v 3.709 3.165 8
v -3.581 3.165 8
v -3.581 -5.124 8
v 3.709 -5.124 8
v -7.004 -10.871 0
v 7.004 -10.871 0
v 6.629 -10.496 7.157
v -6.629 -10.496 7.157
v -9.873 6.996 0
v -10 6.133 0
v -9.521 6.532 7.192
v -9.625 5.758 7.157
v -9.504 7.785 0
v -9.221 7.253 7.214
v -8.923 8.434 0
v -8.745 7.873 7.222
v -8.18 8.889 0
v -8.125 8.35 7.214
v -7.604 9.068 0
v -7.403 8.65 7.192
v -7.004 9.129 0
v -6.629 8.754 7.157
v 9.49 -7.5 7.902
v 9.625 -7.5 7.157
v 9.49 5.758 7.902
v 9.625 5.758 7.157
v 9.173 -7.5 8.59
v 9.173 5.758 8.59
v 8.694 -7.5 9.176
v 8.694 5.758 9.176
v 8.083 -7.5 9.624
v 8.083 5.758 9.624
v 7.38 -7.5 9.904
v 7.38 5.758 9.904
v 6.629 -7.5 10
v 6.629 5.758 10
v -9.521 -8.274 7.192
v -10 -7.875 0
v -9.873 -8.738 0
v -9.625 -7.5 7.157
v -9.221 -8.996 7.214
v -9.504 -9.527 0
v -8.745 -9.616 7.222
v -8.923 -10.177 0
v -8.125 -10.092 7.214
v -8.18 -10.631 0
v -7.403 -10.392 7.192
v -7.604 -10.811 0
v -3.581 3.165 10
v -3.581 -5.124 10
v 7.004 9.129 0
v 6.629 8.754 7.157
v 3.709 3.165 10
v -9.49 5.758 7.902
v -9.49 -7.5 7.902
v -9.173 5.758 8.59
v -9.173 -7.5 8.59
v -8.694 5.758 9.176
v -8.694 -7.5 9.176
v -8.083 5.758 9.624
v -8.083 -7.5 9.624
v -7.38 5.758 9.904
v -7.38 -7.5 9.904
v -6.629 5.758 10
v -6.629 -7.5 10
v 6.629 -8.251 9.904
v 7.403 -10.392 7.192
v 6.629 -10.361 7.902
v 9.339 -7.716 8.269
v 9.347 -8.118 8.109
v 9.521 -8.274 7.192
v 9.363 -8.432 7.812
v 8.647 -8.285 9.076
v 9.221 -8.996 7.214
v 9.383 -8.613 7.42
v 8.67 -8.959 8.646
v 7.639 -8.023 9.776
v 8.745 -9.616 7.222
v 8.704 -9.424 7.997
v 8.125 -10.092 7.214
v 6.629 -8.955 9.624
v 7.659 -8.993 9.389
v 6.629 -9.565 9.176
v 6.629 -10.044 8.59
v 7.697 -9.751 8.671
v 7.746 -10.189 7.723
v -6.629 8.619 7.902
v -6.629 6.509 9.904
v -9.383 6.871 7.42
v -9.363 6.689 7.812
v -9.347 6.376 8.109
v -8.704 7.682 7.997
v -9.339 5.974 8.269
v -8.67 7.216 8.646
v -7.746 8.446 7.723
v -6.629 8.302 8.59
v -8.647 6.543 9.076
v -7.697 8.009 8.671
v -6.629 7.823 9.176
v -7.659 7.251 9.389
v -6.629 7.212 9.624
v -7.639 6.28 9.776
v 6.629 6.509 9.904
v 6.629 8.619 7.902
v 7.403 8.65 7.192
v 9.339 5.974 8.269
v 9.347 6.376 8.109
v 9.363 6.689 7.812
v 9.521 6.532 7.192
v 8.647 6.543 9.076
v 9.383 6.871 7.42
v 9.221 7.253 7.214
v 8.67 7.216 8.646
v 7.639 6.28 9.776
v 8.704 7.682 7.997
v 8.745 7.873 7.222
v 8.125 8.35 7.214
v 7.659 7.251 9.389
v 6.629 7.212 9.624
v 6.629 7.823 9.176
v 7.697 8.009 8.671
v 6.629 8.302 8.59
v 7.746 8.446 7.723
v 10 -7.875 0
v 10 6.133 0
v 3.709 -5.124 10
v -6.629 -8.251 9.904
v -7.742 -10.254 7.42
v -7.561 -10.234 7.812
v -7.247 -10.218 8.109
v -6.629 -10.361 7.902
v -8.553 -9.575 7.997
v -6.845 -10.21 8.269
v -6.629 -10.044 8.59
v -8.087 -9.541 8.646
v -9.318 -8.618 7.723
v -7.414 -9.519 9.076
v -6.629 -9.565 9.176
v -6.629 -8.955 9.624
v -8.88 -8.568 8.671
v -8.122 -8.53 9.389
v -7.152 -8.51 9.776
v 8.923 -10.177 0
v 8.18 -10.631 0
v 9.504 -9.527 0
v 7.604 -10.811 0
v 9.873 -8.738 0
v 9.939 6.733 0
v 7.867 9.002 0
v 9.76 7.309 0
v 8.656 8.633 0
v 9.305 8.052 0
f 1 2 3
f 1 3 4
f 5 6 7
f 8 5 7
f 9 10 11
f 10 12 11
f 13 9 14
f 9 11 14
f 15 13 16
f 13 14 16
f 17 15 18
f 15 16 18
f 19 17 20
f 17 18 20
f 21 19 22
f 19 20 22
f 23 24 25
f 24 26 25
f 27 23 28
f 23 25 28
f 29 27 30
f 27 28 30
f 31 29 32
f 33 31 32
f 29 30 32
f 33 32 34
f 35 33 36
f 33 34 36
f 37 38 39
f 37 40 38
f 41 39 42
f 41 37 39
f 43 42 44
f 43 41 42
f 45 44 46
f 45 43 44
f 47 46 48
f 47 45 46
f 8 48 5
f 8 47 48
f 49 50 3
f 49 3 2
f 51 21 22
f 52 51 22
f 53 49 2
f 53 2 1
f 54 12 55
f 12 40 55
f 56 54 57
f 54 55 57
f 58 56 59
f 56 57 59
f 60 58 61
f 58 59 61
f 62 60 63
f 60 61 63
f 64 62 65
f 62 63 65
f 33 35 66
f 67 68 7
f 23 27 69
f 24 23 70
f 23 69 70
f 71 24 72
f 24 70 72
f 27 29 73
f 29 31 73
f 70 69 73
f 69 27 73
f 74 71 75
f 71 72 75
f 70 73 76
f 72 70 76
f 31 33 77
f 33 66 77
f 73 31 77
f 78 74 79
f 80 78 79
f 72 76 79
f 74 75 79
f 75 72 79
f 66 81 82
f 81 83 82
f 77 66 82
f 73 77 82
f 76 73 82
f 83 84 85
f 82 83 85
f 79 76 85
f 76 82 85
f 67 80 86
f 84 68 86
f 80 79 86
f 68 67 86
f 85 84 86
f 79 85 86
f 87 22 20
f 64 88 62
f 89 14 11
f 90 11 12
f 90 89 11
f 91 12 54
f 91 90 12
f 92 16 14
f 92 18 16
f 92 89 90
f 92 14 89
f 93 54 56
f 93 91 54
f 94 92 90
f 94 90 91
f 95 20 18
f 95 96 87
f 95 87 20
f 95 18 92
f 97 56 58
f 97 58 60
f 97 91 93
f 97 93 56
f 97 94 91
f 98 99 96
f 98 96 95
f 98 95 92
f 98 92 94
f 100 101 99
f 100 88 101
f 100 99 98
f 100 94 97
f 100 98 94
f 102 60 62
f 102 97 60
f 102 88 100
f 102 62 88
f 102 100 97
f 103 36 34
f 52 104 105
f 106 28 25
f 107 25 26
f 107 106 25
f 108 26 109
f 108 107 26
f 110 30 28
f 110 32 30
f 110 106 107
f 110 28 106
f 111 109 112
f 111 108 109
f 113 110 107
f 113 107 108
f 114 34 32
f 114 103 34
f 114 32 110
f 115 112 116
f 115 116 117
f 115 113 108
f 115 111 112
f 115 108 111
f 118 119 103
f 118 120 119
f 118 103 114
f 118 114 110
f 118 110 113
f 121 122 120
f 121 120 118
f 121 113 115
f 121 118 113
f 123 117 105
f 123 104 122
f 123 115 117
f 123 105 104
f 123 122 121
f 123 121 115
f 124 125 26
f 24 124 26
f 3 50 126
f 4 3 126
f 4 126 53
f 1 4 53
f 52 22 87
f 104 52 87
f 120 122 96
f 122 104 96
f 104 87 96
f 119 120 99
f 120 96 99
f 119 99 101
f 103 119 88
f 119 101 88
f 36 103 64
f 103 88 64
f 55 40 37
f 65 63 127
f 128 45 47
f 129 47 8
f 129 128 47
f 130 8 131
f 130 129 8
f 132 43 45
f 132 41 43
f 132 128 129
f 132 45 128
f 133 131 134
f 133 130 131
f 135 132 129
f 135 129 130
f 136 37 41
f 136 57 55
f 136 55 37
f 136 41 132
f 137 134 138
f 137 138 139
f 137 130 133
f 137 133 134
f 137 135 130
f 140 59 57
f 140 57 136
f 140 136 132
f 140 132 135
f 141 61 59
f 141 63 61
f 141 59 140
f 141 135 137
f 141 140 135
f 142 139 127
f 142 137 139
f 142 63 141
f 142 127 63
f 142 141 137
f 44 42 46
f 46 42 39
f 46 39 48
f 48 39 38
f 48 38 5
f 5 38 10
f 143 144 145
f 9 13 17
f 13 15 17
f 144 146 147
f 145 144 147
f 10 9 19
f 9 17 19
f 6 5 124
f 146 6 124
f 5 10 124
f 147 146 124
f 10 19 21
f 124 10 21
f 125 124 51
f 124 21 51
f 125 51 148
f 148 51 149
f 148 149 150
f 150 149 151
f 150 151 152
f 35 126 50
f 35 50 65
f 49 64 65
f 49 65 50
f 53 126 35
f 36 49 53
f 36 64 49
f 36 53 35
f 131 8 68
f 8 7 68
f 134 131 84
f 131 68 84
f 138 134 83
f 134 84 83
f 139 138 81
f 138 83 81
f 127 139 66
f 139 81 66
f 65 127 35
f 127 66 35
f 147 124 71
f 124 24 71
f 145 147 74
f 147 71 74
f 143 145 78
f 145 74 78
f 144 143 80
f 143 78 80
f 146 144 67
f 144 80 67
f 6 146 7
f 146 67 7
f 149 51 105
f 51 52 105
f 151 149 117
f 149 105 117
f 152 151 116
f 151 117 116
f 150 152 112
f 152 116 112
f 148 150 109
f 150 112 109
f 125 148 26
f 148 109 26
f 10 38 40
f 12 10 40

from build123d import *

# Parameters (mm, degrees)
F0_W     = 20
F0_H     = 20
F1_DEPTH = 10
F1_TAPER = 3
F2_R     = 3
F3_W     = 7.29034096
F3_H     = 8.2890868653
F4_DEPTH = 2


with BuildPart() as f1:
    # F0 (on Top) → F1 (new body)
    with BuildSketch(Plane.XY):
        with Locations((0, -0.8712120694)):
            Rectangle(F0_W, F0_H)
    extrude(amount=F1_DEPTH, taper=F1_TAPER)

    # F2
    f2_edges = [f1.edges().sort_by_distance(p)[0] for p in [
        (0, 8.60471, 10),
        (-9.737961, 8.866749, 5),
        (-9.475922, -0.871212, 10),
        (-9.737961, -10.609173, 5),
        (0, -10.347134, 10),
        (9.475922, -0.871212, 10),
        (9.737961, 8.866749, 5),
        (9.737961, -10.609173, 5),
    ]]
    fillet(f2_edges, radius=F2_R)

    # F3 (on face) → F4 (cut)
    with BuildSketch(Plane.XY.offset(10)):
        with Locations((0.0642689411, -0.9792846395)):
            Rectangle(F3_W, F3_H)
    extrude(amount=-F4_DEPTH, mode=Mode.SUBTRACT)


solid = f1.part
